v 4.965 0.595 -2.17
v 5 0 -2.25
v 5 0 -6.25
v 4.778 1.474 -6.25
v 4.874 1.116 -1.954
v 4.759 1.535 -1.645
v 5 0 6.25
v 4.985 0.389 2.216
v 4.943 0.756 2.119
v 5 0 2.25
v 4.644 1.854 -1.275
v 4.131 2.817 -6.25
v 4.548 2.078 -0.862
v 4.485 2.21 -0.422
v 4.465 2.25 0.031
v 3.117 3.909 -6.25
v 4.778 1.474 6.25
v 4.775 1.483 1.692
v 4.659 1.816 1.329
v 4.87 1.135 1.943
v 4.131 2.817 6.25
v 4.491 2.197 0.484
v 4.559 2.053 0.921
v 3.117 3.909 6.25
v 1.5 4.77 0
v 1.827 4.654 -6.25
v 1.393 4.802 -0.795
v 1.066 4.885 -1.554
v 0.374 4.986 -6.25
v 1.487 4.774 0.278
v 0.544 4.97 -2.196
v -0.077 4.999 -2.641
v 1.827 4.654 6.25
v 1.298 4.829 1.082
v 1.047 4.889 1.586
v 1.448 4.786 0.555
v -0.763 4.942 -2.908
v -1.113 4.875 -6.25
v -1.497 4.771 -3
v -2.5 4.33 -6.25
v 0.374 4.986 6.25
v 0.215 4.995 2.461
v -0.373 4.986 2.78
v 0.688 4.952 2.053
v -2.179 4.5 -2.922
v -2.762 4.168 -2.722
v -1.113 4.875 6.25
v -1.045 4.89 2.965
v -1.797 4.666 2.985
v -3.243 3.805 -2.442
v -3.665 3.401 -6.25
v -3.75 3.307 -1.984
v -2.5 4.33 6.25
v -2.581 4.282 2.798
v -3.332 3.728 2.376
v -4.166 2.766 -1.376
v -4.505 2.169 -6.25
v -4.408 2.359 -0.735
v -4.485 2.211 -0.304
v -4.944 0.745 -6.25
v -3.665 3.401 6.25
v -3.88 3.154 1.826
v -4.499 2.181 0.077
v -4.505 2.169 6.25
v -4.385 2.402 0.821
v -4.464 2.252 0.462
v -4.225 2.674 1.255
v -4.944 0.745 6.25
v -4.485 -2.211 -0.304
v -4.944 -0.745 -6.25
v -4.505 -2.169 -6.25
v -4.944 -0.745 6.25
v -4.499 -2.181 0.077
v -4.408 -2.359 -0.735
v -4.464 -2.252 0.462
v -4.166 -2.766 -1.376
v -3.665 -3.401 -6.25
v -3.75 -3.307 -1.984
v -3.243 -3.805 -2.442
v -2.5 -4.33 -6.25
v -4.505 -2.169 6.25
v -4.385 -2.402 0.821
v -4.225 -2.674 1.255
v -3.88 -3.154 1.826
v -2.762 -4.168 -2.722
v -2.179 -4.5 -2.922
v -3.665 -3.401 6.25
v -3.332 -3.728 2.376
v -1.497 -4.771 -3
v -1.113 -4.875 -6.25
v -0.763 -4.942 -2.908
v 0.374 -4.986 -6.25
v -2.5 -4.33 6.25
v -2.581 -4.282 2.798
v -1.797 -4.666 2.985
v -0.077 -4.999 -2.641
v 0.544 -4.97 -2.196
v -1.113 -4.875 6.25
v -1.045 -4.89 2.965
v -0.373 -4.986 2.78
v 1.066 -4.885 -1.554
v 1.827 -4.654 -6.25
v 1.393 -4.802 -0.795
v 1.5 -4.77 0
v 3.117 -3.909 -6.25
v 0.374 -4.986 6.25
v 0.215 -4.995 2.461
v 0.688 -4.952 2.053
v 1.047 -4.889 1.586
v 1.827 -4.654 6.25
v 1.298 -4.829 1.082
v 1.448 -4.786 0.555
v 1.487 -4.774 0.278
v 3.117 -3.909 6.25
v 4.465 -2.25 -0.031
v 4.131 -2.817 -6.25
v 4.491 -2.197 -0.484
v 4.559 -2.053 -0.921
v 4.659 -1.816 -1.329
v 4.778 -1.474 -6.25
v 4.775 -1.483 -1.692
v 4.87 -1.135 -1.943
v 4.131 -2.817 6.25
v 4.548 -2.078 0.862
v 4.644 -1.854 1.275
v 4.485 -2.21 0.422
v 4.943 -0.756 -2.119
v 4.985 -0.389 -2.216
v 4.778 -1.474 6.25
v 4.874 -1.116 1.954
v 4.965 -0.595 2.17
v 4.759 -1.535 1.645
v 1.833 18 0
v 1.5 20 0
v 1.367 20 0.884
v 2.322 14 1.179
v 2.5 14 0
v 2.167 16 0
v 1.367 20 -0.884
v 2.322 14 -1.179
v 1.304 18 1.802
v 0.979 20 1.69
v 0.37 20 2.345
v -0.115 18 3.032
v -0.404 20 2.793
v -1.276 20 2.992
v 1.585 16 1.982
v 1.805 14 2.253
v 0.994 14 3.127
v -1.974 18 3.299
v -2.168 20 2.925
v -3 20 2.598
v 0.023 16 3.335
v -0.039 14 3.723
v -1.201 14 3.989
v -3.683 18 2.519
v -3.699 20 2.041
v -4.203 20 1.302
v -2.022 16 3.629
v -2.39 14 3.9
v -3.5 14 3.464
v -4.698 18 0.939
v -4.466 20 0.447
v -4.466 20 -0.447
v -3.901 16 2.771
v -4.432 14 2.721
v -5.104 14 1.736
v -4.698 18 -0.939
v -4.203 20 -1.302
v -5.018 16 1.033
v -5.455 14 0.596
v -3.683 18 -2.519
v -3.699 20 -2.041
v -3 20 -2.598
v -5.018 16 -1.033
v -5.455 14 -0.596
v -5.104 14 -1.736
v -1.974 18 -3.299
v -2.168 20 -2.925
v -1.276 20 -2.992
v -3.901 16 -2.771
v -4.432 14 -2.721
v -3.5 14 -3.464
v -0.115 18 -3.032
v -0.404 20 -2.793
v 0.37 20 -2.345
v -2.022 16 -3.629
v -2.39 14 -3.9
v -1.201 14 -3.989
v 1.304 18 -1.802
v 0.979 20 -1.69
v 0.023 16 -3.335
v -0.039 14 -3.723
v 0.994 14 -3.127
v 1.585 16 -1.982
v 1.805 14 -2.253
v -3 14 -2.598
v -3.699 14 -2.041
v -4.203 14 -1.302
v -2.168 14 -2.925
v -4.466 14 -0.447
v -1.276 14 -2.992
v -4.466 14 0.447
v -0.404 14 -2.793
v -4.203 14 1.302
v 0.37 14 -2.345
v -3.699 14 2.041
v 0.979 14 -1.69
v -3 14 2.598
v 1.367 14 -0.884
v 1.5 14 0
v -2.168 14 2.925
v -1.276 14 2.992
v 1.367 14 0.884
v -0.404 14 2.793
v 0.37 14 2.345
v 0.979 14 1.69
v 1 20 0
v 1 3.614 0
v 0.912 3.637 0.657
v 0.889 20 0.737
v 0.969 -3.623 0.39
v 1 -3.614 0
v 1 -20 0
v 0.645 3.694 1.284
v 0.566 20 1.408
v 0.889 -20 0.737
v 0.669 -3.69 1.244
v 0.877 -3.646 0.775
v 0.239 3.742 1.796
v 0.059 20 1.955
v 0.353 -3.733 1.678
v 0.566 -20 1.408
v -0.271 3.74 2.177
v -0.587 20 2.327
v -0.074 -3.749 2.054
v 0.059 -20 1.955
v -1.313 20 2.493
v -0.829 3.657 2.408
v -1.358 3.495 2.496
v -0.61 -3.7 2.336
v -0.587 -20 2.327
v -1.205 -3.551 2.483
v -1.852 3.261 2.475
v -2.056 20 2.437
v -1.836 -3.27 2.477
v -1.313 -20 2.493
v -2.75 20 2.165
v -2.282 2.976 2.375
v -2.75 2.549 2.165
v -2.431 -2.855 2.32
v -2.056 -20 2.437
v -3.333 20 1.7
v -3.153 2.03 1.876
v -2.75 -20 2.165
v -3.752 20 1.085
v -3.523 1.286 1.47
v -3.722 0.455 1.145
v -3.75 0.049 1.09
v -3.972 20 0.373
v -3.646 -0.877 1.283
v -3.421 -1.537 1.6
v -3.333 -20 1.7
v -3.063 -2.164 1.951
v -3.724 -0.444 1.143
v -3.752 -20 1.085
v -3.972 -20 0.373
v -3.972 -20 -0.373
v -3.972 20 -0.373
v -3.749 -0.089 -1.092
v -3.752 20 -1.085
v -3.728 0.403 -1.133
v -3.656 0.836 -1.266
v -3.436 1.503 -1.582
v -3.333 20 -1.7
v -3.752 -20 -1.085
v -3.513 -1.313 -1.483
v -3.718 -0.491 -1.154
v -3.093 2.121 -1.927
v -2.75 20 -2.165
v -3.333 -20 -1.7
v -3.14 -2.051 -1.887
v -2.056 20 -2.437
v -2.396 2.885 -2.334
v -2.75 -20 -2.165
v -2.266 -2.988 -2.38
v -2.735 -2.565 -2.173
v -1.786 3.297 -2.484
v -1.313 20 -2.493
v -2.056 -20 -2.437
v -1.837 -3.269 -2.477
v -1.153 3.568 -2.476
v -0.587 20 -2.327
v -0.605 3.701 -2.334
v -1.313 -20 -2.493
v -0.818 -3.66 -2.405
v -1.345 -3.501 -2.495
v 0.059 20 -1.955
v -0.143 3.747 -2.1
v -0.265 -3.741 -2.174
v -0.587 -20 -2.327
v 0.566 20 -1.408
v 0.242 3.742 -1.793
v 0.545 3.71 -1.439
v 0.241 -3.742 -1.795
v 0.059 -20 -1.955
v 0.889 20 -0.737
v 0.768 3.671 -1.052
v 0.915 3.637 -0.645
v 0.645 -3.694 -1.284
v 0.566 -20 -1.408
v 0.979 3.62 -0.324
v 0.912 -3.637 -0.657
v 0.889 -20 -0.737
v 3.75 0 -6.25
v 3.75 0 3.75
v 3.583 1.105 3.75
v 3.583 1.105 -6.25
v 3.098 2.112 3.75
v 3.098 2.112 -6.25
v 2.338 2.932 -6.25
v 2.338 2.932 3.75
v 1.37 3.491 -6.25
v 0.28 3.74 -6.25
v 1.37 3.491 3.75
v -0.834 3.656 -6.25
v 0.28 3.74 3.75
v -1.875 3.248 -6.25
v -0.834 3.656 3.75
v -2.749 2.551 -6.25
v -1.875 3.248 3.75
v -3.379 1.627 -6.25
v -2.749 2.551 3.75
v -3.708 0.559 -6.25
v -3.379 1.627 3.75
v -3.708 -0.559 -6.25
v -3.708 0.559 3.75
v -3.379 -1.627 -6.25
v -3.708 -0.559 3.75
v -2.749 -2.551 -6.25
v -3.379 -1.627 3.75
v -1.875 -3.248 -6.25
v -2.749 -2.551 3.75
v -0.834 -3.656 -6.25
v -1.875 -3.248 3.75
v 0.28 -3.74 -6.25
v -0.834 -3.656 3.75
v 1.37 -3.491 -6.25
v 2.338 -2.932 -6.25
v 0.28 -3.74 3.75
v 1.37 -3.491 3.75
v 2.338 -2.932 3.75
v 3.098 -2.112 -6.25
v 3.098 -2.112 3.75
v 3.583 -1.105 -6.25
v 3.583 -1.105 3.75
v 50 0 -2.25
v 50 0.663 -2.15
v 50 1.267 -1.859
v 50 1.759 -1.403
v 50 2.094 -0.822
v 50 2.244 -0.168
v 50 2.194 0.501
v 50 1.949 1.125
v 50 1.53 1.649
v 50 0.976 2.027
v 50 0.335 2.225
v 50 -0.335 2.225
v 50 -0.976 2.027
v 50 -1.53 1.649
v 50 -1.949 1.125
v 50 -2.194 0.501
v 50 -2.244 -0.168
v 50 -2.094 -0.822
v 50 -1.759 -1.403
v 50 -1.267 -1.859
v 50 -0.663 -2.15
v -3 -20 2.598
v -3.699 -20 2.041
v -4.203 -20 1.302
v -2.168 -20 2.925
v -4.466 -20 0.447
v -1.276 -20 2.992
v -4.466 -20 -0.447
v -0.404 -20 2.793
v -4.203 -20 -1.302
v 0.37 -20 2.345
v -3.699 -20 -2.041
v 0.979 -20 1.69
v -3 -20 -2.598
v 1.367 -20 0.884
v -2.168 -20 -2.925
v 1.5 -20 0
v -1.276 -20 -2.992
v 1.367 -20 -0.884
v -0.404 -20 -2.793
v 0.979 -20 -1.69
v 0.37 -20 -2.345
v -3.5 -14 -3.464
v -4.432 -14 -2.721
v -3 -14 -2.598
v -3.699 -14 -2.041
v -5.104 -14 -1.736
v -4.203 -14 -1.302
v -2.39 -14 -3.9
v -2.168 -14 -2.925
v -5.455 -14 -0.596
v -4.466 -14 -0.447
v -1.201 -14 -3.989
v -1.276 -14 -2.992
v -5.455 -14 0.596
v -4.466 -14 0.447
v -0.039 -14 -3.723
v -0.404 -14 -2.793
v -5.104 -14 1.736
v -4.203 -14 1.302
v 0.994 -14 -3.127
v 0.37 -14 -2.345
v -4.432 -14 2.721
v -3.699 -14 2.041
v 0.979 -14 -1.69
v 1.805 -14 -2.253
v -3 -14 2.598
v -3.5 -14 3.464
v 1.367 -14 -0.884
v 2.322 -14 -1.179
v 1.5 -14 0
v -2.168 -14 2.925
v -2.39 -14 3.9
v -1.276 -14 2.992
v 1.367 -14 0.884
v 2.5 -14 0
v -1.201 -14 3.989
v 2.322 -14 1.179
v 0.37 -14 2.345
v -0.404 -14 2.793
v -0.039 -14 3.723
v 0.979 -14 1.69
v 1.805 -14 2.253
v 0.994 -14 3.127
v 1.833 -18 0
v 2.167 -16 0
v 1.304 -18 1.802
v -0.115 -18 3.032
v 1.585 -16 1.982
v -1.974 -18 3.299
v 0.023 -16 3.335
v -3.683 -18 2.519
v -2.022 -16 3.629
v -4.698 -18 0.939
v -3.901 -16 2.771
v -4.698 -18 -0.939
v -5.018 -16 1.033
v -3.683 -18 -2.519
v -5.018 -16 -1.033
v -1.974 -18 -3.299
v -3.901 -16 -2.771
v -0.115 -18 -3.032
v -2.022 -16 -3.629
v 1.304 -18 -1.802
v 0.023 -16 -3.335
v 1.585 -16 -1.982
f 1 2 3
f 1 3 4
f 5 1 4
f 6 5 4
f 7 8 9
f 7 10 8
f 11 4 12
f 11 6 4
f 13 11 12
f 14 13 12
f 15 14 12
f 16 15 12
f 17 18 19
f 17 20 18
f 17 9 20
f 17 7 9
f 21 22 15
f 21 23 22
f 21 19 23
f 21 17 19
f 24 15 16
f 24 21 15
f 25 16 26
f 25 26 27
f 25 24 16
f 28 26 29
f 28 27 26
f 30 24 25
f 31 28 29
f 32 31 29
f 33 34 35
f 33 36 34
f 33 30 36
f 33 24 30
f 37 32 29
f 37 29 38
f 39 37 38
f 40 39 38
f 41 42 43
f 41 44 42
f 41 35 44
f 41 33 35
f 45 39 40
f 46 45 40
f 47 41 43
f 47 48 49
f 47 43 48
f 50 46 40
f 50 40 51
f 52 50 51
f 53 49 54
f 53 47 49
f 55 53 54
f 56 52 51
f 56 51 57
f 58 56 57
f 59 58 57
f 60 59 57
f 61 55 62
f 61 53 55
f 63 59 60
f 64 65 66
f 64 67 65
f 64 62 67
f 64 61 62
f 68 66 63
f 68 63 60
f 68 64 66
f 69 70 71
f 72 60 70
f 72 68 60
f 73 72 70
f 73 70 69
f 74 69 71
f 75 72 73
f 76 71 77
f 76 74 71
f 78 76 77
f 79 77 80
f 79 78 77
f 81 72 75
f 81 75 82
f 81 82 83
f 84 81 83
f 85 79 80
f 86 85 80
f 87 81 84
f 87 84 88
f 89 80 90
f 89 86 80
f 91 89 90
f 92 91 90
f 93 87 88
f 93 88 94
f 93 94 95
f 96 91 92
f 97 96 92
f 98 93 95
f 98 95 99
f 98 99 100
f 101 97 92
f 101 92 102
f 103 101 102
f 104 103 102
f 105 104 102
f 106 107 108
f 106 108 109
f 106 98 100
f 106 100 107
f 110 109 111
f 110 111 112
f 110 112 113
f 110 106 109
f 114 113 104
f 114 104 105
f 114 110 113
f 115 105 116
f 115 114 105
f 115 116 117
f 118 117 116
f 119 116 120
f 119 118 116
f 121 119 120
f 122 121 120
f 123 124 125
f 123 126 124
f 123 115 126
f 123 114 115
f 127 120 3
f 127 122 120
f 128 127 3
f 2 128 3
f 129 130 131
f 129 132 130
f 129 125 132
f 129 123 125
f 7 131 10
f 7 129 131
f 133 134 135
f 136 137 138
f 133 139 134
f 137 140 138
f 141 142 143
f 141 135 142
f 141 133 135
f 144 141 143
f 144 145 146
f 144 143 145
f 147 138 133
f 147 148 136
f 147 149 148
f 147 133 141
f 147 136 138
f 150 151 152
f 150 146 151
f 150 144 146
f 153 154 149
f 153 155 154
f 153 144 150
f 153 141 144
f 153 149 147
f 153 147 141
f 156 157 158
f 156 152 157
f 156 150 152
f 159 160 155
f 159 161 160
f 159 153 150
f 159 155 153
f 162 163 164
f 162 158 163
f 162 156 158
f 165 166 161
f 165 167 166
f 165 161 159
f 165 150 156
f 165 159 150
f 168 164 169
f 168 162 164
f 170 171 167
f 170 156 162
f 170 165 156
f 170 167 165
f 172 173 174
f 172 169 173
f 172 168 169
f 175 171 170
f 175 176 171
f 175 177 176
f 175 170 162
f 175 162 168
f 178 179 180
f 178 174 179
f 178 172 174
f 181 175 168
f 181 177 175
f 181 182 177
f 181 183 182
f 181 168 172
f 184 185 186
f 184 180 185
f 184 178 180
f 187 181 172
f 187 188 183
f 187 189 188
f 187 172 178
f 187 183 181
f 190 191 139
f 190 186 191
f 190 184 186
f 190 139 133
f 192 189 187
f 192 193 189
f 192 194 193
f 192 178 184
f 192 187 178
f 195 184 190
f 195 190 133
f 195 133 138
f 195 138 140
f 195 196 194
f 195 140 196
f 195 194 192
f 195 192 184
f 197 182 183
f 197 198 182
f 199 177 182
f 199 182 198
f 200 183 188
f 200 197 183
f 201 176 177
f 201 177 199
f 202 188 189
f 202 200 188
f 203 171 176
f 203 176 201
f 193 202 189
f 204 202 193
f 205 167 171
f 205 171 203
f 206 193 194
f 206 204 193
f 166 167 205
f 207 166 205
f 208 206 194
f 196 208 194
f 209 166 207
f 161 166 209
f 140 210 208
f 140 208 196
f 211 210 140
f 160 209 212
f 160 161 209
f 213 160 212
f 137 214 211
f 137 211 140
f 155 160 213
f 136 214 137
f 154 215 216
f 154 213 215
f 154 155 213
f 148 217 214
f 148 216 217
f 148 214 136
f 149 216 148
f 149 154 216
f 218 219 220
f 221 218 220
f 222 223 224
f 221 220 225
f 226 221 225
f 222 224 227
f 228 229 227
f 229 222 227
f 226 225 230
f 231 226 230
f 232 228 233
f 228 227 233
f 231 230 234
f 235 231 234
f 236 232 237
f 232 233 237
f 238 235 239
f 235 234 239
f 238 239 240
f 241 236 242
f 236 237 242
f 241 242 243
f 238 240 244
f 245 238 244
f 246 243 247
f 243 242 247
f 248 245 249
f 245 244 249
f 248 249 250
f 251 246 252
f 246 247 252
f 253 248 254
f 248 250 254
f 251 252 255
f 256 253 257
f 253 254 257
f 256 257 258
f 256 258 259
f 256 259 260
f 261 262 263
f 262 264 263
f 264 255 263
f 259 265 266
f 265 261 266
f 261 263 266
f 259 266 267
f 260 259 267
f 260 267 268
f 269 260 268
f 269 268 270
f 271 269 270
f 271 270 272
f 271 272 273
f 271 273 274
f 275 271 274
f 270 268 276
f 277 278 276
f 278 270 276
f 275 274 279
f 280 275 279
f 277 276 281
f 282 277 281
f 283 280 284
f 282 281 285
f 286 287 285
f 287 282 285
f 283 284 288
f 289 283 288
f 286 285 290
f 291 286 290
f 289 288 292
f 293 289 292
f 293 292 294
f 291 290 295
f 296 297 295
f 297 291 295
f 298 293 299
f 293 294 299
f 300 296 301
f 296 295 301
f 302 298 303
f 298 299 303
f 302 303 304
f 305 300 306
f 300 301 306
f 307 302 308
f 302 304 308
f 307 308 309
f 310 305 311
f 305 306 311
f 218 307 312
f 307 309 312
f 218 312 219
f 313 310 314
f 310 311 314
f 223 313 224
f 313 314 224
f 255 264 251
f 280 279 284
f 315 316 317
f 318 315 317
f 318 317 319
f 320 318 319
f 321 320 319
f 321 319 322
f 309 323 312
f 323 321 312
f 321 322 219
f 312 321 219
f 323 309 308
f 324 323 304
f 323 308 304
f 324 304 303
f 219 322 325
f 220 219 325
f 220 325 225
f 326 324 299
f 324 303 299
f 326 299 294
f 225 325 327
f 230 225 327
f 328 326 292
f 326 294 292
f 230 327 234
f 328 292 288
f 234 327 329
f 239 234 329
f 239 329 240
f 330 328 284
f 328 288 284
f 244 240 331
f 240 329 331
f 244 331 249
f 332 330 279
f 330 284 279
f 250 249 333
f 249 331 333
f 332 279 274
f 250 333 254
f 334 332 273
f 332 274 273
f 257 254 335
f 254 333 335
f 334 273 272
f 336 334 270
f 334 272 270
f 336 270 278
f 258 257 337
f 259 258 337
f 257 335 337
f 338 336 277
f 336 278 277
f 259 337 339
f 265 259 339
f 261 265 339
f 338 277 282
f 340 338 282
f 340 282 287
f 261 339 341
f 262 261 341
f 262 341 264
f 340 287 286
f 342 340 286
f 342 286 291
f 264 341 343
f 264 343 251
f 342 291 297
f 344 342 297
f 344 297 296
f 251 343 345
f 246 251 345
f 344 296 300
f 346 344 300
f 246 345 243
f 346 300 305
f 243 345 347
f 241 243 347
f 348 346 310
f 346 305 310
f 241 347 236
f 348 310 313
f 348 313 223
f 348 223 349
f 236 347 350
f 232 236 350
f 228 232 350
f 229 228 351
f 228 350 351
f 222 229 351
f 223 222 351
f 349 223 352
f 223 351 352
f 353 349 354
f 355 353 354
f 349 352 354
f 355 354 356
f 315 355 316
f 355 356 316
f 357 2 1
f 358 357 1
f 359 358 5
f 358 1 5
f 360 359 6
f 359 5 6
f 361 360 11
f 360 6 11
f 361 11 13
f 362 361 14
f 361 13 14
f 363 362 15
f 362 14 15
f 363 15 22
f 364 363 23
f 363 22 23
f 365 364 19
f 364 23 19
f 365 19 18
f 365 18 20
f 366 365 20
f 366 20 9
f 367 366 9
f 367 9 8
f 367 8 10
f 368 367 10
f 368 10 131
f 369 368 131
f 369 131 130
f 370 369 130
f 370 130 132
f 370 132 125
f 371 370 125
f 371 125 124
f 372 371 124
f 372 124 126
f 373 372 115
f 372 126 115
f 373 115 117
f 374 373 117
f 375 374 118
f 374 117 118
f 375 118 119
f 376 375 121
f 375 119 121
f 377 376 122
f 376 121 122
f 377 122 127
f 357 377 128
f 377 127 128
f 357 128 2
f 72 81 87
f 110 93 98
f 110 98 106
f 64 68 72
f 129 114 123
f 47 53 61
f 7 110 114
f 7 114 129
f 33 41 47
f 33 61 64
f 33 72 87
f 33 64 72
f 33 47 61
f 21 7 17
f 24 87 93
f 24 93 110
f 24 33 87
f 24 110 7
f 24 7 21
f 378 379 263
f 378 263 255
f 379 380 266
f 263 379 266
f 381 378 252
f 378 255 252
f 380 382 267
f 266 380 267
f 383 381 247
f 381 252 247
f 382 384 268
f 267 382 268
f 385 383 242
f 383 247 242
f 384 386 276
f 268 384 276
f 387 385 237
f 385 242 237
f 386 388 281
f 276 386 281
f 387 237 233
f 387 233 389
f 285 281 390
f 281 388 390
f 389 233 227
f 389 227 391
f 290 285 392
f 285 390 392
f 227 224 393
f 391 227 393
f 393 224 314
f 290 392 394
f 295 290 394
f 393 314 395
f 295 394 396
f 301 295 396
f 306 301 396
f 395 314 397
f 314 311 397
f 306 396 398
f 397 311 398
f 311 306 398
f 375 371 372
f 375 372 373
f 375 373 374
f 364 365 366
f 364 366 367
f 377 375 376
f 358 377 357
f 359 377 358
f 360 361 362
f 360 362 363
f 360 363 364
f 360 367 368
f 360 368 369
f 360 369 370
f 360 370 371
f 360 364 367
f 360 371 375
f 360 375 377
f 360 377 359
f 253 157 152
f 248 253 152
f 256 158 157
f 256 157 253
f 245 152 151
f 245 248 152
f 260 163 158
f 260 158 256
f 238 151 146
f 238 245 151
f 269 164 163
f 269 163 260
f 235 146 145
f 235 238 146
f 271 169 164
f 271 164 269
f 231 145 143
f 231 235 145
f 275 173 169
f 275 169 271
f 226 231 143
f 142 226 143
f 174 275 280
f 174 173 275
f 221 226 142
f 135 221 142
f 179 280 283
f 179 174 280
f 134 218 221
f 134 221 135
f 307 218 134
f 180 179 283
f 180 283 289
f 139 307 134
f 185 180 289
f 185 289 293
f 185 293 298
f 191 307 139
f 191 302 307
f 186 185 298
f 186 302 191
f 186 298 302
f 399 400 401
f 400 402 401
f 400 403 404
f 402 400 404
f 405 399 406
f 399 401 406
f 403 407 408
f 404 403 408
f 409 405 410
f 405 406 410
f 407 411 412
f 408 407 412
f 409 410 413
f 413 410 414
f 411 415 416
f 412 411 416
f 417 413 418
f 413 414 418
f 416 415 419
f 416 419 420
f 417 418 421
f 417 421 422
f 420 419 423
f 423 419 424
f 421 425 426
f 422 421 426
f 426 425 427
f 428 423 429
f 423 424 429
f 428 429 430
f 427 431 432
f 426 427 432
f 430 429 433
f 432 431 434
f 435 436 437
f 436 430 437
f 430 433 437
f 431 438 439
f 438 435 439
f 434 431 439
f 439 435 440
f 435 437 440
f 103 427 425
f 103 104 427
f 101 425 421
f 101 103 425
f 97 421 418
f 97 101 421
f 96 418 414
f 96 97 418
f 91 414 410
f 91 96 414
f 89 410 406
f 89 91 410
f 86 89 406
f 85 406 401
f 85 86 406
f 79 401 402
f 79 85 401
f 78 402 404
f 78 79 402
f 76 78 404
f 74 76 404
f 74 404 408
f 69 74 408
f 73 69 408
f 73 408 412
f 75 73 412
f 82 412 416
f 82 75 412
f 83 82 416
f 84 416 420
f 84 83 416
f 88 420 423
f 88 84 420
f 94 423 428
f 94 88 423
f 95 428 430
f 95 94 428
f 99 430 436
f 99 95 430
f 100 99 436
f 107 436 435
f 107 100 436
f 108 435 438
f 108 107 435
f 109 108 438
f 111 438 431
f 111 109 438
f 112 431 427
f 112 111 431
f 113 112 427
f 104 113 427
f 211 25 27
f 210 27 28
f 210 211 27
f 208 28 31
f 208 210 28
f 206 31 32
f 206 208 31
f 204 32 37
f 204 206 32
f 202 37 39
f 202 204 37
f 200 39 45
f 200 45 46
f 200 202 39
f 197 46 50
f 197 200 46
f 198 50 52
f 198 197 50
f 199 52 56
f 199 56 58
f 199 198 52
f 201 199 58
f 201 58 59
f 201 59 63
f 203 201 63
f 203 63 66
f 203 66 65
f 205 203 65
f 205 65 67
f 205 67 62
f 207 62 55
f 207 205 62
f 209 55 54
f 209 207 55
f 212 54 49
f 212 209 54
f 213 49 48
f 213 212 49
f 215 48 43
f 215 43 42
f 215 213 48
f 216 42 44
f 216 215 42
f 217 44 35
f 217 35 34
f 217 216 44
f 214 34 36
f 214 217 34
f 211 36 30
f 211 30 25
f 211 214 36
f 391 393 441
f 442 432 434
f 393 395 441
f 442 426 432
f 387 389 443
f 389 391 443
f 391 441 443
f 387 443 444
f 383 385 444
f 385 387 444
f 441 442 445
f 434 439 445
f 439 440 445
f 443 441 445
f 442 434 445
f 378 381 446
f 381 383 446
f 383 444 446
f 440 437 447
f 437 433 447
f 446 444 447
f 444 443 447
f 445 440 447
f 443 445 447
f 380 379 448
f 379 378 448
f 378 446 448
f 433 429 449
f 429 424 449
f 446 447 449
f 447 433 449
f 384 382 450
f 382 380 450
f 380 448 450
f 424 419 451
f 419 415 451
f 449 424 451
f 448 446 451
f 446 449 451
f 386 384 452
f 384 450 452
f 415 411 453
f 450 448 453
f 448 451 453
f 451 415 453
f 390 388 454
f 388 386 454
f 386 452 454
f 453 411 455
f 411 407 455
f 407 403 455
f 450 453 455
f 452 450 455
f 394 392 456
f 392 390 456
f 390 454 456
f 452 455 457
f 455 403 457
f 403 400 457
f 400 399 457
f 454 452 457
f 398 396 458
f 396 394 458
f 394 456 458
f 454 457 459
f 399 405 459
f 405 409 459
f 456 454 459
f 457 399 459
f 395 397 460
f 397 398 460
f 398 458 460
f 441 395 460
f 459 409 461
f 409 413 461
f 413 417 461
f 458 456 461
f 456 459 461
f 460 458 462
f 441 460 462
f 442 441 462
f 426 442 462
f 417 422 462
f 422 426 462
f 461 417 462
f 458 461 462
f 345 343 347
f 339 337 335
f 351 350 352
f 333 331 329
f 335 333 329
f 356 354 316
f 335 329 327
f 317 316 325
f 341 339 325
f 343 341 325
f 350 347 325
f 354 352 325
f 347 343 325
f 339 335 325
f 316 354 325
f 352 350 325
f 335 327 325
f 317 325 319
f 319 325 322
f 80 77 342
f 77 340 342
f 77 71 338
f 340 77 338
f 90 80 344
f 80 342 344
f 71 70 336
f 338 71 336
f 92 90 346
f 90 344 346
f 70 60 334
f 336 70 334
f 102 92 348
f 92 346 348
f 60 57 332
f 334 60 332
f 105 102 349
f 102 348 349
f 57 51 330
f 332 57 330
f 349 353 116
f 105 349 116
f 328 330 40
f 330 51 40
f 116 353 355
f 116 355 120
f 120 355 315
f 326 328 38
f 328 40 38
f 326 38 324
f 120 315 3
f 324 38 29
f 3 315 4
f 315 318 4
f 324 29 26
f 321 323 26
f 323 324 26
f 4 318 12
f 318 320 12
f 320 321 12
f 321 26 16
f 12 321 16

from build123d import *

# Parameters (mm, degrees)
SKETCH1_R           = 5
BOSS_EXTRUDE1_DEPTH = 6.25
SKETCH2_R           = 3
BOSS_EXTRUDE2_DEPTH = 20
SKETCH3_R           = 2.25
BOSS_EXTRUDE3_DEPTH = 50
SKETCH4_R           = 2.5
CUT_EXTRUDE1_DEPTH  = 40
CUT_EXTRUDE2_REACH  = 14.5
SKETCH5_R           = 3.75
SKETCH7_R           = 5
BOSS_EXTRUDE4_DEPTH = 2.5


with BuildPart() as part:
    # Sketch1 → Boss-Extrude1 (new body, symmetric)
    with BuildSketch(Plane.XY):
        Circle(SKETCH1_R)
    extrude(amount=BOSS_EXTRUDE1_DEPTH, both=True)

    # Sketch2 → Boss-Extrude2 (add, symmetric)
    with BuildSketch(Plane(origin=(0, 0, 0), x_dir=(1, 0, 0), z_dir=(0, 1, 0))):
        with Locations((-1.5, 0)):
            Circle(SKETCH2_R)
    extrude(amount=BOSS_EXTRUDE2_DEPTH, both=True)

    # Sketch3 → Boss-Extrude3 (add)
    with BuildSketch(Plane(origin=(0, 0, 0), x_dir=(0, 0, -1), z_dir=(1, 0, 0))):
        Circle(SKETCH3_R)
    extrude(amount=BOSS_EXTRUDE3_DEPTH)

    # Sketch4 → Cut-Extrude1 (cut)
    with BuildSketch(Plane.XZ.offset(20)):
        with Locations((-1.5, 0)):
            Circle(SKETCH4_R)
    extrude(amount=-CUT_EXTRUDE1_DEPTH, mode=Mode.SUBTRACT)

    # Sketch5 → Cut-Extrude2 (cut, up to next)
    with BuildSketch(Plane.XY.offset(6.25), mode=Mode.PRIVATE) as cut_extrude2_sk1:
        Circle(SKETCH5_R)
    cut_extrude2_tool1 = extrude(cut_extrude2_sk1.sketch, amount=-CUT_EXTRUDE2_REACH, mode=Mode.PRIVATE) & part.part
    add(cut_extrude2_tool1.solids().sort_by_distance((0, 0, 6.25))[0], mode=Mode.SUBTRACT)

    # Sketch7 → Boss-Extrude4 (add)
    with BuildSketch(Plane.XY.offset(6.25)):
        Circle(SKETCH7_R)
    extrude(amount=-BOSS_EXTRUDE4_DEPTH)

    # Sketch6 → Revolve1 (revolve)
    with BuildSketch(Plane.XY):
        Polygon((1.5, 14), (1.5, 20), (2.5, 14), align=None)
        Polygon((1.5, -20), (2.5, -14), (1.5, -14), align=None)
    revolve(axis=Axis((-1.5, 20, 0), (0, -1, 0)))


solid = part.part
